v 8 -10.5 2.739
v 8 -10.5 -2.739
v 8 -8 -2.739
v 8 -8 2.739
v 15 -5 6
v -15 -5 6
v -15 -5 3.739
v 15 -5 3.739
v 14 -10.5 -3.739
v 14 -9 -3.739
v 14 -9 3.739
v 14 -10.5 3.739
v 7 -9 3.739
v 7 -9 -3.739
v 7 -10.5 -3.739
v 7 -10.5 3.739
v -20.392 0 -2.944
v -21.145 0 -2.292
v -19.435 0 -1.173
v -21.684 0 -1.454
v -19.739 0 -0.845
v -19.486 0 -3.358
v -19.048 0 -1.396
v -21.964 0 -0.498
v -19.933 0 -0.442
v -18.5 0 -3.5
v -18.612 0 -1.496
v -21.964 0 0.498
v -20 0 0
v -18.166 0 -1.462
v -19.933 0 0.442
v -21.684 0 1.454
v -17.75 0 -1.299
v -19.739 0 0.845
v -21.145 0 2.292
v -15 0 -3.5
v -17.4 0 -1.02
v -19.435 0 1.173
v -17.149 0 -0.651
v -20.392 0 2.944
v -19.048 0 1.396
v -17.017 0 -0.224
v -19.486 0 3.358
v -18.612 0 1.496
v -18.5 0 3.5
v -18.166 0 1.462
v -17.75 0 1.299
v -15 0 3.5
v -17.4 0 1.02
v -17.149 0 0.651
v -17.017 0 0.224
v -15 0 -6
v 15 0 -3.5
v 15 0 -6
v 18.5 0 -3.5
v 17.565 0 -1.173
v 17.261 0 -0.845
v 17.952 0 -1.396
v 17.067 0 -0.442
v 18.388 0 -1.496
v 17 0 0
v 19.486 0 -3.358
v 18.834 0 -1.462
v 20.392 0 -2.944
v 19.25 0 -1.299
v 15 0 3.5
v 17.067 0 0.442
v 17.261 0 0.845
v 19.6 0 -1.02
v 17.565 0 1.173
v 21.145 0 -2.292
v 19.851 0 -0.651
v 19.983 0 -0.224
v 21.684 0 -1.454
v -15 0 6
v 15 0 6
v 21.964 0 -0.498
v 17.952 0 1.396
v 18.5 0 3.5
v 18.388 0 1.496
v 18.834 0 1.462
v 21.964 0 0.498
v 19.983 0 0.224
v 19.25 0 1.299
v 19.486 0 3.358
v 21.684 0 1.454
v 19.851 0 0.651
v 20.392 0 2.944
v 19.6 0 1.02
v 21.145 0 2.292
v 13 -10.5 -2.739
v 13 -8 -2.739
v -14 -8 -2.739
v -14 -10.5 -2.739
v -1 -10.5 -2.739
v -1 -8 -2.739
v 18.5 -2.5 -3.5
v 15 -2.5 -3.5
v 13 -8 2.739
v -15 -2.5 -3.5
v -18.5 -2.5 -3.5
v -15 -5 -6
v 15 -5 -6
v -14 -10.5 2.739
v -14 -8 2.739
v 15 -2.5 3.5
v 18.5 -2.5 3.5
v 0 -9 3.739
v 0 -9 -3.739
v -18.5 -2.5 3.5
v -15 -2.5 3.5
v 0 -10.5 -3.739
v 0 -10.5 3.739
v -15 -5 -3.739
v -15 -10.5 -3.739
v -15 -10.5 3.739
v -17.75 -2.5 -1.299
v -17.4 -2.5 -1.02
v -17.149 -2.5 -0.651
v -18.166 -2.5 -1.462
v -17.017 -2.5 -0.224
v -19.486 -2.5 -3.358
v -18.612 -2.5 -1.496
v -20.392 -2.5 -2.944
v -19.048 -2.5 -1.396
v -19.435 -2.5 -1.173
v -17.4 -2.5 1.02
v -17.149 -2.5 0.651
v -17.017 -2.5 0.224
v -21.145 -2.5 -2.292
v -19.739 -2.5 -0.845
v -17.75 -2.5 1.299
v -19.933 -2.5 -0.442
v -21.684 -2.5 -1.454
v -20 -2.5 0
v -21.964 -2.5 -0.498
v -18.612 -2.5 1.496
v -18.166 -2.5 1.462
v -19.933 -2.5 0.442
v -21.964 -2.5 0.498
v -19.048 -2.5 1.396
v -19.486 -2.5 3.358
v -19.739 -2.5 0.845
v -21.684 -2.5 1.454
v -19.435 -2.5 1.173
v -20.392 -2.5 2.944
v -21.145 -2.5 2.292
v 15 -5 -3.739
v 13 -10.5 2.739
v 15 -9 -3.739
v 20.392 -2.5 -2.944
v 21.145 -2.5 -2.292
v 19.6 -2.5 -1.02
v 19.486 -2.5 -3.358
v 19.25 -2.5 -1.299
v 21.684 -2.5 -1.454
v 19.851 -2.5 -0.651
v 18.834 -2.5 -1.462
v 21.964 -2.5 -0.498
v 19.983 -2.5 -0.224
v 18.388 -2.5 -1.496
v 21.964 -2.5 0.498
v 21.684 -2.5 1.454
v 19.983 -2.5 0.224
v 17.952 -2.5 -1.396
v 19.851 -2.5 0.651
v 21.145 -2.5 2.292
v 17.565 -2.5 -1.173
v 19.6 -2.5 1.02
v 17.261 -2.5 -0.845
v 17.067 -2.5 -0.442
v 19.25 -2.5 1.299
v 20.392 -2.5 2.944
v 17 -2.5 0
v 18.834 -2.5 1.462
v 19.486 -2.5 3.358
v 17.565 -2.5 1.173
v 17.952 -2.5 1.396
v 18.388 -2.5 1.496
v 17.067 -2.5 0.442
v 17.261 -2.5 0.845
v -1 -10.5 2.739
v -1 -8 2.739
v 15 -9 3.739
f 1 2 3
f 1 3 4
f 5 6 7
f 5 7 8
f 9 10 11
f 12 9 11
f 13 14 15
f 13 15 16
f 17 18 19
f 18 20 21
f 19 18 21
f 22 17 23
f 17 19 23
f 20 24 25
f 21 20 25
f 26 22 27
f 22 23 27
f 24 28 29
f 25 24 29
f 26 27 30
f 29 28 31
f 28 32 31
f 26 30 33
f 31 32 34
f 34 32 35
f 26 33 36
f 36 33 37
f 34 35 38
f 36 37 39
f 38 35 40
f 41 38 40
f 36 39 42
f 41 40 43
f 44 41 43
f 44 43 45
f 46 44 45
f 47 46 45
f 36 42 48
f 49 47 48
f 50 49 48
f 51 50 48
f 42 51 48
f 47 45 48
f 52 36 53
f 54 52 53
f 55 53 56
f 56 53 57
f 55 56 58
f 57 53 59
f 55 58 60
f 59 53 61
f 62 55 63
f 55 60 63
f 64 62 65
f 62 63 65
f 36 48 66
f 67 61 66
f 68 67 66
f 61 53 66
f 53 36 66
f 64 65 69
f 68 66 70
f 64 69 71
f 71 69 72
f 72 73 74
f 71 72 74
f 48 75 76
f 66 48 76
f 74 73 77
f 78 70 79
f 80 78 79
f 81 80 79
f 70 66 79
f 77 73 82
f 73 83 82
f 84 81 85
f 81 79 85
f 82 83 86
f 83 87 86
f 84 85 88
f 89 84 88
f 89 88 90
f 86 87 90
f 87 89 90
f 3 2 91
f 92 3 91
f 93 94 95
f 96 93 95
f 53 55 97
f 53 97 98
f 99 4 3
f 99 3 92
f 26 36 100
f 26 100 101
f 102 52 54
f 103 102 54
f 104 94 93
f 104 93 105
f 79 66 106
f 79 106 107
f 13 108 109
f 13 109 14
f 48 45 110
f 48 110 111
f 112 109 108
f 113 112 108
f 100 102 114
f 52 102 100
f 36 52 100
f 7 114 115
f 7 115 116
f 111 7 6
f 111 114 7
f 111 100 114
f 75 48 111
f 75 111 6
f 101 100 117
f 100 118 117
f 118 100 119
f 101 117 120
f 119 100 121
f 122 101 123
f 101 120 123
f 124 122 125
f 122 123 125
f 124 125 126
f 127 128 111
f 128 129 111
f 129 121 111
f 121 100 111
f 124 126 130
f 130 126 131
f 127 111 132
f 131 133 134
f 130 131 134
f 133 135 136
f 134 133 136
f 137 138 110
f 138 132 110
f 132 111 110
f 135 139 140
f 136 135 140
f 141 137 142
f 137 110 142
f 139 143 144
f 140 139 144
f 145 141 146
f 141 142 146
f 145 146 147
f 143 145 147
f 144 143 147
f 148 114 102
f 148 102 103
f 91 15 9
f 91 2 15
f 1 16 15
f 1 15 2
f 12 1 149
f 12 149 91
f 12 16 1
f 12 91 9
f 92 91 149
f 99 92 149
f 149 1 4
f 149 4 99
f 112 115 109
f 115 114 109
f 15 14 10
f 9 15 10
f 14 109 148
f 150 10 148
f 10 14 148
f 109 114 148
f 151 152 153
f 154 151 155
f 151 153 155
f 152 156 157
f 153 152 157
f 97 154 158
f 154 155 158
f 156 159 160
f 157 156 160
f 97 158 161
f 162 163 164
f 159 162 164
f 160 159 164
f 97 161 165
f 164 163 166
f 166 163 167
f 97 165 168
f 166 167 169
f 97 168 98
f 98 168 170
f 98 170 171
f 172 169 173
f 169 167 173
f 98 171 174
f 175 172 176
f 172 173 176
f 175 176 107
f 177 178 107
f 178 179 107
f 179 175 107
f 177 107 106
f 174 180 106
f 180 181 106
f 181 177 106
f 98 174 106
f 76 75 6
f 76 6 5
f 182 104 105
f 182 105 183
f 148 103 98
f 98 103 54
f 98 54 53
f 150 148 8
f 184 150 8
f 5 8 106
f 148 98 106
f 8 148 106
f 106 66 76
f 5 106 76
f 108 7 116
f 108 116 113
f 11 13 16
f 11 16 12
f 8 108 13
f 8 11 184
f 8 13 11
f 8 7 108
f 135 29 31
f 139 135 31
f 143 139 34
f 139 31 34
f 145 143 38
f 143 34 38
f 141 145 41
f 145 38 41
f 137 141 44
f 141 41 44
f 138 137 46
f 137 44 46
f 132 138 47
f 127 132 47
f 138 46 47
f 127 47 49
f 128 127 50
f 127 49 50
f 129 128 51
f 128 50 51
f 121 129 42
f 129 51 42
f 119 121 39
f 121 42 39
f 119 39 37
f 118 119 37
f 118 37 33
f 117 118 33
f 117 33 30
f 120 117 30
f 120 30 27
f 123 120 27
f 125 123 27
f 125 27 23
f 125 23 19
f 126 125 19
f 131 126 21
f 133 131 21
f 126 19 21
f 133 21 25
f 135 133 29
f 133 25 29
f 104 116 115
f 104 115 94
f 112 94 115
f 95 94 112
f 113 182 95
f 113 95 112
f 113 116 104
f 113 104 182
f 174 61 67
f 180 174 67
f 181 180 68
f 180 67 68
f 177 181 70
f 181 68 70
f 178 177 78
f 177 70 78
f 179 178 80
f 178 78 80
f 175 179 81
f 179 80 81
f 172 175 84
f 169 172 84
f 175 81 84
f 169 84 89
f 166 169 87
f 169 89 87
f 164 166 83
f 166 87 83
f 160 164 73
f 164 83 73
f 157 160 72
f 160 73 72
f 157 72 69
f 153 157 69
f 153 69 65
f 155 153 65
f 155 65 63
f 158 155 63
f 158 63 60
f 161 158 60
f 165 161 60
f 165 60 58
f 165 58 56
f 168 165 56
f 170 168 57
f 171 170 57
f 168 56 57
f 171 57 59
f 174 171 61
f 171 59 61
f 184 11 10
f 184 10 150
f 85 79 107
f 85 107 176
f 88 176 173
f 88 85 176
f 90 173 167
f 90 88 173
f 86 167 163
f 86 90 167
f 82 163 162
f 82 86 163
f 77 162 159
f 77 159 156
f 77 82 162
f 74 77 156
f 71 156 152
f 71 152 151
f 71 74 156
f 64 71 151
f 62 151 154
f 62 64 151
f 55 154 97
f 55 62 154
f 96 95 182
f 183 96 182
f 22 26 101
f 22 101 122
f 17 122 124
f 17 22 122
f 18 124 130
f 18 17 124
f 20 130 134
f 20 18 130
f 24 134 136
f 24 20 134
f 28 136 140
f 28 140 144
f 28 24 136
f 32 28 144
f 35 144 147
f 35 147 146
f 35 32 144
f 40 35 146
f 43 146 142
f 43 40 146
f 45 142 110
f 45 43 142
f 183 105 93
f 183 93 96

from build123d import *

# Parameters (mm, degrees)
F0_W     = 30
F0_H     = 12
F1_DEPTH = 5
F2_W     = 30
F2_H     = 7.47772
F3_DEPTH = 4
F4_W     = 15
F4_H     = 7.47772
F4_W_2   = 7
F5_DEPTH = 1.5
F6_W     = 13
F6_H     = 5.47772
F6_W_2   = 5
F7_DEPTH = 2.5
F8_R     = 1.5
F9_DEPTH = 2.5


with BuildPart() as f1:
    # F0 (on Front) → F1 (new body)
    with BuildSketch(Plane.XZ):
        Rectangle(F0_W, F0_H)
    extrude(amount=F1_DEPTH)

    # F2 (on face) → F3 (join)
    with BuildSketch(Plane.XZ.offset(5)):
        Rectangle(F2_W, F2_H)
    extrude(amount=F3_DEPTH)

    # F4 (on face) → F5 (join)
    with BuildSketch(Plane.XZ.offset(9)):
        with Locations((-7.5, 0)):
            Rectangle(F4_W, F4_H)
        with Locations((10.5, 0)):
            Rectangle(F4_W_2, F4_H)
    extrude(amount=F5_DEPTH)

    # F6 (on face) → F7 (cut)
    with BuildSketch(Plane.XZ.offset(10.5)):
        with Locations((-7.5, 0)):
            Rectangle(F6_W, F6_H)
        with Locations((10.5, 0)):
            Rectangle(F6_W_2, F6_H)
    extrude(amount=-F7_DEPTH, mode=Mode.SUBTRACT)

    # F8 (on face) → F9 (join)
    with BuildSketch(Plane(origin=(0, 0, 0), x_dir=(-1, 0, 0), z_dir=(0, 1, 0))):
        with BuildLine():
            Line((-15, 3.5), (-18.5, 3.5))
            ThreePointArc((-18.5, 3.5), (-22, 0), (-18.5, -3.5))
            Line((-18.5, -3.5), (-15, -3.5))
            Line((-15, -3.5), (-15, 3.5))
        make_face()
        with Locations((-18.5, 0)):
            Circle(F8_R, mode=Mode.SUBTRACT)
        with BuildLine():
            Line((18.5, 3.5), (15, 3.5))
            Line((15, 3.5), (15, -3.5))
            Line((15, -3.5), (18.5, -3.5))
            ThreePointArc((18.5, -3.5), (22, 0), (18.5, 3.5))
        make_face()
        with Locations((18.5, 0)):
            Circle(F8_R, mode=Mode.SUBTRACT)
    extrude(amount=-F9_DEPTH)


solid = f1.part
